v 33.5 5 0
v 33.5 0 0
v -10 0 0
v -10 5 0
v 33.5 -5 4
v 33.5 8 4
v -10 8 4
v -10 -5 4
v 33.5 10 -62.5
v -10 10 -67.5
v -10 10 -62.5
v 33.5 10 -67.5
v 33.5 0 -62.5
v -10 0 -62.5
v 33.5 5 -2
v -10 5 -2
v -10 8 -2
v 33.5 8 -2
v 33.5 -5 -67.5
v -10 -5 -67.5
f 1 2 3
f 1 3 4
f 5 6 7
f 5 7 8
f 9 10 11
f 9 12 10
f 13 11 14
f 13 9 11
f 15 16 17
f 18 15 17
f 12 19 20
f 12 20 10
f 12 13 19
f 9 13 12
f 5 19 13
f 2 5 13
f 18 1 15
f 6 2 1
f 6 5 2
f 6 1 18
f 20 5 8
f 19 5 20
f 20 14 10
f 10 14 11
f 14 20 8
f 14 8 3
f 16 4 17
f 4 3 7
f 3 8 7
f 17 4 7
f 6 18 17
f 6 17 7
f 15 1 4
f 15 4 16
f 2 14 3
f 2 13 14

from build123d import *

# Parameters (mm, degrees)
F1_DEPTH      = 33.5
F1_DEPTH_BACK = 10


with BuildPart() as f1:
    # F0 (on Right) → F1 (new body, two sides)
    with BuildSketch(Plane.YZ) as f1_sk:
        Polygon((0, -62.5), (0, 0), (5, 0), (5, -2), (8, -2), (8, 4), (-5, 4), (-5, -67.5), (10, -67.5), (10, -62.5), align=None)
    extrude(amount=F1_DEPTH)
    extrude(f1_sk.sketch, amount=-F1_DEPTH_BACK)


solid = f1.part
